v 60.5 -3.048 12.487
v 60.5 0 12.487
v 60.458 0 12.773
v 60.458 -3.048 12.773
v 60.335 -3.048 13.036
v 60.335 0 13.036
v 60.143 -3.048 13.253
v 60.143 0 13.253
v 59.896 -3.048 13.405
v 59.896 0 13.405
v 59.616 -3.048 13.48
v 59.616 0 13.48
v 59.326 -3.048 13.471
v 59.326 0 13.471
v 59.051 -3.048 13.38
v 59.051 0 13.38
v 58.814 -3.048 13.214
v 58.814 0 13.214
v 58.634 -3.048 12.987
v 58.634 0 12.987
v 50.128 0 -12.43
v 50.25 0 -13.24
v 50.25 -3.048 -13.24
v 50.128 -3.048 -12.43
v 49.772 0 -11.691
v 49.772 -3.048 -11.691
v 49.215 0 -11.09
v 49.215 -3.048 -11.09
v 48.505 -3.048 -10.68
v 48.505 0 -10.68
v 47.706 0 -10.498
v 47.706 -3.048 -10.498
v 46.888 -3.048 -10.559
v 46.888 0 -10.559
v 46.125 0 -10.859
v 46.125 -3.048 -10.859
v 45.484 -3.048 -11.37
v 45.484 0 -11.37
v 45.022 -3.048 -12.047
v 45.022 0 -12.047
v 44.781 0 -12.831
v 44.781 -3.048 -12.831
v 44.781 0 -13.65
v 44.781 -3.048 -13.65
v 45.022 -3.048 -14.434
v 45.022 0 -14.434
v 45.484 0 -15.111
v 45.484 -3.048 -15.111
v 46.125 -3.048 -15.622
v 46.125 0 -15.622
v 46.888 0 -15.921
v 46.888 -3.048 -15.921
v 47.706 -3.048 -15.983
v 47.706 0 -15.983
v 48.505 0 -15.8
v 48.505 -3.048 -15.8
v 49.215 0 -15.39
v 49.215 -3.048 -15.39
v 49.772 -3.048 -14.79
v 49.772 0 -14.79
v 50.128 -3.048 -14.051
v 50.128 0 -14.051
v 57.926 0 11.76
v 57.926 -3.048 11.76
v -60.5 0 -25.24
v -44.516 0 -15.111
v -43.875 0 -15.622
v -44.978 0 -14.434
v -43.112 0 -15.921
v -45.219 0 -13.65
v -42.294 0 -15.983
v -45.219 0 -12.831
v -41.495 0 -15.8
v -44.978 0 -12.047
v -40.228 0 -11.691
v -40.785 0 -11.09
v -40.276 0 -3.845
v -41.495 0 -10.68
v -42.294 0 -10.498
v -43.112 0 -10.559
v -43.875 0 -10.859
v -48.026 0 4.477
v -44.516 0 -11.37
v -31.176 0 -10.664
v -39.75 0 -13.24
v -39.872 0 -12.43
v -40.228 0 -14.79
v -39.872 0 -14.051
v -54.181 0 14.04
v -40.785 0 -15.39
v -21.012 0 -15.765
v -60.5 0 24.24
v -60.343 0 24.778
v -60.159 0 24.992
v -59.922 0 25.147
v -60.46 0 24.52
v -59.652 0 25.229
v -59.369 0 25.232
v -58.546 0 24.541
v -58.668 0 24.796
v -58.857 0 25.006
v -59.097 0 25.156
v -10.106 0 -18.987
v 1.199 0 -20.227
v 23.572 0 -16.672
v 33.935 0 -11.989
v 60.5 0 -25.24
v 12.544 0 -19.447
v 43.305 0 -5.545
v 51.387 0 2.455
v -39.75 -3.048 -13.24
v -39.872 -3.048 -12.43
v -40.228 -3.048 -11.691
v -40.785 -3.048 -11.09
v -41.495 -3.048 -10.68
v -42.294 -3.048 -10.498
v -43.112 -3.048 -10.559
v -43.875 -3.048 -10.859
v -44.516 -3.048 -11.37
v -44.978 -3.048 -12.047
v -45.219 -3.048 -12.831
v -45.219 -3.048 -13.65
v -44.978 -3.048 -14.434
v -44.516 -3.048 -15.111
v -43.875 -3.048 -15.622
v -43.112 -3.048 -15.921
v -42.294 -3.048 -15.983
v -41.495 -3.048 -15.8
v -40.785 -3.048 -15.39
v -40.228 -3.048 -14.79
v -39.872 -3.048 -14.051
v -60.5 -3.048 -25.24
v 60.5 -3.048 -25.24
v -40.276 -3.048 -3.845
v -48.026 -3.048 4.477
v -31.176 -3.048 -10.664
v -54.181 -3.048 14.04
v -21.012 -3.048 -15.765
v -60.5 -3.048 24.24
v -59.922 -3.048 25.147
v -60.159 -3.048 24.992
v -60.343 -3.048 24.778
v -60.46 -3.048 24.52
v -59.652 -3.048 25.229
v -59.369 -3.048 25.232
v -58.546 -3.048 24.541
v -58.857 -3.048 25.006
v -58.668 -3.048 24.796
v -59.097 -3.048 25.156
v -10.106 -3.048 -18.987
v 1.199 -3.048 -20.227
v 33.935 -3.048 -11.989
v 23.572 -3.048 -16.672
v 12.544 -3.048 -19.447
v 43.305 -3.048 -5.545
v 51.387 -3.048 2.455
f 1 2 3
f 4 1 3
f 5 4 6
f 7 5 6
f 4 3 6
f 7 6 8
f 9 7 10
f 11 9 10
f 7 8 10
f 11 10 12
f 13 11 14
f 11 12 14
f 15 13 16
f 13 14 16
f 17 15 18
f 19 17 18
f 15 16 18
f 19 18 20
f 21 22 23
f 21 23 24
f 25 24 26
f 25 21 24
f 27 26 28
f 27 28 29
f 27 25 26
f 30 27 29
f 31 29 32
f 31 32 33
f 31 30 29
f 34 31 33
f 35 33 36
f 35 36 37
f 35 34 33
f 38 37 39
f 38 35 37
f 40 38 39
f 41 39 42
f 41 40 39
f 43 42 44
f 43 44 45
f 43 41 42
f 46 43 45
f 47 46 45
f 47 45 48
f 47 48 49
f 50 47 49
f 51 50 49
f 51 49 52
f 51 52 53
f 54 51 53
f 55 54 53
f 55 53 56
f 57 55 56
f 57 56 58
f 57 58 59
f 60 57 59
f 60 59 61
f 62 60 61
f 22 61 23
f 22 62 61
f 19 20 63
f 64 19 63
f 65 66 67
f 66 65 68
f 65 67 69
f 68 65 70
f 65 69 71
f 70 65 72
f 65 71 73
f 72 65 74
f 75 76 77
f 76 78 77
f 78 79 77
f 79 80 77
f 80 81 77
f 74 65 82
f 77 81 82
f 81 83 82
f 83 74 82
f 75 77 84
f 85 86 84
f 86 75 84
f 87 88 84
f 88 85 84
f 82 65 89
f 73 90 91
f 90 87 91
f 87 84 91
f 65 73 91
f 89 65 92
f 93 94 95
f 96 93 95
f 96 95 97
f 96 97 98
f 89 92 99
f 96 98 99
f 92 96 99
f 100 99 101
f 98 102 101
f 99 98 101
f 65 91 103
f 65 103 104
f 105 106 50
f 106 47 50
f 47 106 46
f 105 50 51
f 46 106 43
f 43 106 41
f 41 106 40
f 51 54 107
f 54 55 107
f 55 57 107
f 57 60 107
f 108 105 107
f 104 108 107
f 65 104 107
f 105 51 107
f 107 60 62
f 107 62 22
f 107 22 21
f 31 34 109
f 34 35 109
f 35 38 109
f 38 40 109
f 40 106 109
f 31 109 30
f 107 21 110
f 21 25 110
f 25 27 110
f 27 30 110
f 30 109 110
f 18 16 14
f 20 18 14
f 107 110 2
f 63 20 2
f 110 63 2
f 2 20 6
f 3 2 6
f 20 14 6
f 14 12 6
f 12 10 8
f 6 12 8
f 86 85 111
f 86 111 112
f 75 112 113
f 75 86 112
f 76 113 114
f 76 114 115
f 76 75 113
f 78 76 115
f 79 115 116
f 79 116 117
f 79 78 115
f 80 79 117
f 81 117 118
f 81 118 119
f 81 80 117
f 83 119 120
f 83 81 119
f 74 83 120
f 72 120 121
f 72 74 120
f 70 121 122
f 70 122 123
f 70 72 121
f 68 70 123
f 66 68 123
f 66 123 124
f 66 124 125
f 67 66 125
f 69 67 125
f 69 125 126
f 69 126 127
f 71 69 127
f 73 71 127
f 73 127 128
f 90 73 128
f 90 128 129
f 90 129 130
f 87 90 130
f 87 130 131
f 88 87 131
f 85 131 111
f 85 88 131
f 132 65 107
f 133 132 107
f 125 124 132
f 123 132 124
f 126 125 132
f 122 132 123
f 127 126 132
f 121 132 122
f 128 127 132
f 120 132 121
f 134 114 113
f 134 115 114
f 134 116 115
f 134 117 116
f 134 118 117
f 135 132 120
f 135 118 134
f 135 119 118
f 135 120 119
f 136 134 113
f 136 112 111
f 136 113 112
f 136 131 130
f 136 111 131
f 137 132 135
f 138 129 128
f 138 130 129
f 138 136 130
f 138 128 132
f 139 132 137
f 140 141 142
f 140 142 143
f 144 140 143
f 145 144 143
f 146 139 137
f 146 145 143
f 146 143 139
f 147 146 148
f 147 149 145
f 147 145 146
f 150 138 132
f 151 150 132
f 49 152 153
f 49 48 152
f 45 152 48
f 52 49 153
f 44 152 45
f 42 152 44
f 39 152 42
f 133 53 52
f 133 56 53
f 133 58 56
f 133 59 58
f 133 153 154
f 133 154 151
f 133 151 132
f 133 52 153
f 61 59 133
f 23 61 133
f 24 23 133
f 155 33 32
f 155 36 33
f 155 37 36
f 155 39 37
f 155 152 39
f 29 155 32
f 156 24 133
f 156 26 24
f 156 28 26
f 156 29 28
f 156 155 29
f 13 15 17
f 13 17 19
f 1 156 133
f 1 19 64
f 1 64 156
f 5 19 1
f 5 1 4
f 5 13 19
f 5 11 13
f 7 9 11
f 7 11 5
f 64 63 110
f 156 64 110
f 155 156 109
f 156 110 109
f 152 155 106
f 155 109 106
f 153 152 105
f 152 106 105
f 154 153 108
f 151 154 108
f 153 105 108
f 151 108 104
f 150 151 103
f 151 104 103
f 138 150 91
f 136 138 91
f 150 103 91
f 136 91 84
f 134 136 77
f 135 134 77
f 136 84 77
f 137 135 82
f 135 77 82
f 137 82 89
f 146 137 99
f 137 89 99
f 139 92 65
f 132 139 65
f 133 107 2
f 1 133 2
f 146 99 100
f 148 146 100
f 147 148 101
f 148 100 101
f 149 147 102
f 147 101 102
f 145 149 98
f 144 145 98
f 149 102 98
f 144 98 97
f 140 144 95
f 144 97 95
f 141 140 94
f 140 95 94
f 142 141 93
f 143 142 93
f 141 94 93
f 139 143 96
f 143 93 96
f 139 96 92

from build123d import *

# Parameters (mm, degrees)
F0_R     = 2.7500072
F1_DEPTH = 3.048


# Not quite as in the source:
# - ends of sketch curves that miss each other by under 0.0002 mm in the source are joined


with BuildPart() as f1:
    # F0 (on Front) → F1 (new body)
    with BuildSketch(Plane.XZ):
        with BuildLine():
            ThreePointArc((60.500006, 12.486513), (59.7588291045, 13.4524362039), (58.6339869962, 12.986516621))
            Line((58.6339869962, 12.986516621), (57.9256398, 11.7596158))
            ThreePointArc((57.9256398, 11.7596158), (-4.481139989, -19.8585023044), (-58.5461372224, 24.5406923411))
            ThreePointArc((-58.5461372224, 24.5406923411), (-59.6518971954, 25.2287800004), (-60.4999806, 24.2403884))
            Line((-60.4999806, 24.2403884), (-60.4999806, -25.2403864))
            Line((-60.4999806, -25.2403864), (60.500006, -25.2403864))
            Line((60.500006, -25.2403864), (60.500006, 12.486513))
        make_face()
        with Locations((-42.4999912, -13.240385)):
            Circle(F0_R, mode=Mode.SUBTRACT)
        with Locations((47.5000066, -13.240385)):
            Circle(F0_R, mode=Mode.SUBTRACT)
    extrude(amount=F1_DEPTH)


solid = f1.part
